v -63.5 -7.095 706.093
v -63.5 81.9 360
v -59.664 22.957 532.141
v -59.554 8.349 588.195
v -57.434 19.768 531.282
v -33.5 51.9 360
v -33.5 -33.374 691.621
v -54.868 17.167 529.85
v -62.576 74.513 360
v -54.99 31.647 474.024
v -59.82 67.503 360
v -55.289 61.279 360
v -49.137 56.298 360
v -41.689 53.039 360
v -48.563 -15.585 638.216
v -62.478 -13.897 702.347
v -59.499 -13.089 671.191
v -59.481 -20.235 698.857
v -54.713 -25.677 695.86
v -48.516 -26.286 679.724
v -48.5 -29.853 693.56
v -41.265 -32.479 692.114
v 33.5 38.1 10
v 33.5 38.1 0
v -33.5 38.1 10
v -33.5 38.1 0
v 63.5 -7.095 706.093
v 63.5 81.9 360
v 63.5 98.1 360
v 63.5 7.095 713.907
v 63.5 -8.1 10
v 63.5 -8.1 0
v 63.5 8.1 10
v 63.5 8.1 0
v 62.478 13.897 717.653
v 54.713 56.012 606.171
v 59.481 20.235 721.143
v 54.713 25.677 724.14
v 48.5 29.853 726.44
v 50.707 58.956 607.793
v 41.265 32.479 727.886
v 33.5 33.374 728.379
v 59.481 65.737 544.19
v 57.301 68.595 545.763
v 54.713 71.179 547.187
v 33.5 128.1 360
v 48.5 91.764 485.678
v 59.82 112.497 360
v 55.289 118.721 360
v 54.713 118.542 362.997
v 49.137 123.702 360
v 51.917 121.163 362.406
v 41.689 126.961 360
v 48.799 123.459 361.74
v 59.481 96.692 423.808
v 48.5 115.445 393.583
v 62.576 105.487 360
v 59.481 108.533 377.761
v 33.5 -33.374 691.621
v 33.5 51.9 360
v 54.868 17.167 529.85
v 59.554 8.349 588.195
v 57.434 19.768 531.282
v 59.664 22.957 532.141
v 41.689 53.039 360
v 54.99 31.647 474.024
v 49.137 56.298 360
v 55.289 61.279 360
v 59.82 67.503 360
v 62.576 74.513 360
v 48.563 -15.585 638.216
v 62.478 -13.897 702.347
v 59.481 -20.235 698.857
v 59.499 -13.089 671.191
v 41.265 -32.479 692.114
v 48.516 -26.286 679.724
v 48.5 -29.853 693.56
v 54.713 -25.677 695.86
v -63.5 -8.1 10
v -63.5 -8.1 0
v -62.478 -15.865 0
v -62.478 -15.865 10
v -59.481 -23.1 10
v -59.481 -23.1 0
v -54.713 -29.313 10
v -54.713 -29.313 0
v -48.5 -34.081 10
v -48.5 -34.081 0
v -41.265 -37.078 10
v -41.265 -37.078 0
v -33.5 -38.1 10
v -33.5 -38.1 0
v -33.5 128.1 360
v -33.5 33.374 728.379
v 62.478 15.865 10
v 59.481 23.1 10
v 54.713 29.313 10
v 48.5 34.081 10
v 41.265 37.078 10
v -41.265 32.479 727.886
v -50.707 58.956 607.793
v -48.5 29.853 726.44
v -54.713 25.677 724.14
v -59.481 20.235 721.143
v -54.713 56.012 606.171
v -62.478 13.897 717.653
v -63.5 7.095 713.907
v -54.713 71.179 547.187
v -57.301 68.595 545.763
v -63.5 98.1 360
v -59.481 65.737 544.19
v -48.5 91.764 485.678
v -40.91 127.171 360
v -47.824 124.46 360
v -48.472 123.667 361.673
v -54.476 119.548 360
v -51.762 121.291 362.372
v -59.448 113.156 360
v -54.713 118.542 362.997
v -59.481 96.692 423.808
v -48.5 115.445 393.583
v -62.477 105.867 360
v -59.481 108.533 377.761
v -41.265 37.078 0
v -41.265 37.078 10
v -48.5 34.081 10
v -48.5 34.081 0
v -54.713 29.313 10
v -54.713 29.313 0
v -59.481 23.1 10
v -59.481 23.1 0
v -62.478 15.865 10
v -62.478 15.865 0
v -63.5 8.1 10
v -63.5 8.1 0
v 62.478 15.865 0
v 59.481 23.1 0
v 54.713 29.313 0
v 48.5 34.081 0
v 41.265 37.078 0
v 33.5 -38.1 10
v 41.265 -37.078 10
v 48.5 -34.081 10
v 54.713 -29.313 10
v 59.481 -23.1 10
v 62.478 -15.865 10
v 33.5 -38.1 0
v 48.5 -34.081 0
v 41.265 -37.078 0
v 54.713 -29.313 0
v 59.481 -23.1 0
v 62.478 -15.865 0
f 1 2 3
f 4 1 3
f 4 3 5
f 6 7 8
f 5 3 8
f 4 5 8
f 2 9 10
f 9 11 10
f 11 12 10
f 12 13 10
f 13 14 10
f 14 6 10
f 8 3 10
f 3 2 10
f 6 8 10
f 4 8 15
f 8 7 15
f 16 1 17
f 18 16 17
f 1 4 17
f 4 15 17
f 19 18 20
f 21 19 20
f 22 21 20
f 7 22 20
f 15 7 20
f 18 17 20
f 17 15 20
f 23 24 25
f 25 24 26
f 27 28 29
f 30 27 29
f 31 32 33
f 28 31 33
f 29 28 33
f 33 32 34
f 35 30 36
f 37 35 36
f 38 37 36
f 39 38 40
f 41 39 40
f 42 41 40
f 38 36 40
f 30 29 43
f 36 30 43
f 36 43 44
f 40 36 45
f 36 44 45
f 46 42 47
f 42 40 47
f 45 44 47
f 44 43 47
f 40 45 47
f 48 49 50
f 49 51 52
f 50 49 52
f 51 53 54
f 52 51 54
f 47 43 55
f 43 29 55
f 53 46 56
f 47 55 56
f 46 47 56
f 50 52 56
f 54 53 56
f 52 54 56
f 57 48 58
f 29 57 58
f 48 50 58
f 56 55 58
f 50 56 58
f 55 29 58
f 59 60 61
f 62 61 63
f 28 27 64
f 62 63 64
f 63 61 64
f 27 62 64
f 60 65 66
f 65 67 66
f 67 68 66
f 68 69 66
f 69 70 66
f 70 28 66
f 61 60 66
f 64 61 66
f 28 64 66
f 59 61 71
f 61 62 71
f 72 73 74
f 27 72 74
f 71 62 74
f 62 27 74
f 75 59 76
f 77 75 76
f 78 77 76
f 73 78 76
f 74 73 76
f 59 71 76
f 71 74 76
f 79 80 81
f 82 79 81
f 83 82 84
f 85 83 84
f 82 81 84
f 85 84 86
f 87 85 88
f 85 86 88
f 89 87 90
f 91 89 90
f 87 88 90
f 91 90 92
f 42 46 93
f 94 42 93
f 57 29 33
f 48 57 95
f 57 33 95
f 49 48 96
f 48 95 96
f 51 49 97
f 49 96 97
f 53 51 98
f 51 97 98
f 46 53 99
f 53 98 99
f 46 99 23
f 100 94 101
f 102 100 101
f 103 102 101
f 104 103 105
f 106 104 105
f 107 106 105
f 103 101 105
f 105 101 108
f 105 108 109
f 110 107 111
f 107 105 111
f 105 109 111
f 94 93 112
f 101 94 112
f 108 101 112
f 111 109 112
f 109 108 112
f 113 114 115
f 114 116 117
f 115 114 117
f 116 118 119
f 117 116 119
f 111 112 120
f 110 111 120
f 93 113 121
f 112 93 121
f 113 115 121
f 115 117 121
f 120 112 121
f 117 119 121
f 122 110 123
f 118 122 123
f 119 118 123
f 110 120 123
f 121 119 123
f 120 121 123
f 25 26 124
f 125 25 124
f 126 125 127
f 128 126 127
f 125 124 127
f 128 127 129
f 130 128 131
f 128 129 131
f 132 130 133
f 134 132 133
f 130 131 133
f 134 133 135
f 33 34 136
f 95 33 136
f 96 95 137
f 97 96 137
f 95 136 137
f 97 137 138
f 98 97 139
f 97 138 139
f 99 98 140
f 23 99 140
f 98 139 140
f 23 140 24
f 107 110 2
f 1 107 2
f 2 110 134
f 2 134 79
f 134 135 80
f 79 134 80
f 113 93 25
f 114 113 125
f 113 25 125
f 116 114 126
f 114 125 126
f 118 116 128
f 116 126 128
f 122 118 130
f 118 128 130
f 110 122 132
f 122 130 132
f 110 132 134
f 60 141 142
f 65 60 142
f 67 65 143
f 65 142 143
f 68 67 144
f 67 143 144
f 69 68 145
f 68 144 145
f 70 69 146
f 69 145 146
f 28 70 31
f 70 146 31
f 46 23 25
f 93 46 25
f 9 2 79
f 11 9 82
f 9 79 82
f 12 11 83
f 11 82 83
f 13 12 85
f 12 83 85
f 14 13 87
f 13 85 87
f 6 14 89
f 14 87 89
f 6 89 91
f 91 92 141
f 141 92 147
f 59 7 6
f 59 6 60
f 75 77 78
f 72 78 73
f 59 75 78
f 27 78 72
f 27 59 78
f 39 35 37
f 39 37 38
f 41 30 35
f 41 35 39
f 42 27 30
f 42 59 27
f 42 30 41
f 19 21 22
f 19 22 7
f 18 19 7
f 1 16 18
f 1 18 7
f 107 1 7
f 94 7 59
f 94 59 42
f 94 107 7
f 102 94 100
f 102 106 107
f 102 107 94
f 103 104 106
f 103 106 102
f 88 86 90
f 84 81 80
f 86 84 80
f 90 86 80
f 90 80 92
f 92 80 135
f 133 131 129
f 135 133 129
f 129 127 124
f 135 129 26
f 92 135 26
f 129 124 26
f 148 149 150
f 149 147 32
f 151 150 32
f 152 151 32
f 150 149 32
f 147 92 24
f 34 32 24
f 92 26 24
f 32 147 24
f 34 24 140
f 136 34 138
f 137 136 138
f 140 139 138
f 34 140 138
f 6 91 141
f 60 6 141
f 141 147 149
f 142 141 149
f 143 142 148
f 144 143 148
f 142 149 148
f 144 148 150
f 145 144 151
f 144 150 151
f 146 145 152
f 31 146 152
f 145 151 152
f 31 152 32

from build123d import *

# Parameters (mm, degrees)
SALIENTE_EXTRUIR1_DEPTH = 10


with BuildPart() as part:
    # Croquis1 → Saliente-Extruir1 (new body)
    with BuildSketch(Plane.XY):
        with BuildLine():
            Line((-33.5, -38.1), (33.5, -38.1))
            ThreePointArc((33.5, -38.1), (54.713203436, -29.313203436), (63.5, -8.1))
            Line((63.5, -8.1), (63.5, 8.1))
            ThreePointArc((63.5, 8.1), (54.713203436, 29.313203436), (33.5, 38.1))
            Line((33.5, 38.1), (-33.5, 38.1))
            ThreePointArc((-33.5, 38.1), (-54.713203436, 29.313203436), (-63.5, 8.1))
            Line((-63.5, 8.1), (-63.5, -8.1))
            ThreePointArc((-63.5, -8.1), (-54.713203436, -29.313203436), (-33.5, -38.1))
        make_face()
    extrude(amount=SALIENTE_EXTRUIR1_DEPTH)

    # Barrer1: sweep along a curve in space
    with BuildLine() as barrer1_path:
        Line((0, 90, 360), (0, 0, 10))
        Line((0, 90, 360), (0, 0, 710))
    # Croquis3 → Barrer1 (sweep)
    with BuildSketch(Plane.XY.offset(10)):
        with BuildLine():
            Line((33.5, -38.1), (-33.5, -38.1))
            ThreePointArc((-33.5, -38.1), (-54.713203436, -29.313203436), (-63.5, -8.1))
            Line((-63.5, -8.1), (-63.5, 8.1))
            ThreePointArc((-63.5, 8.1), (-54.713203436, 29.313203436), (-33.5, 38.1))
            Line((-33.5, 38.1), (33.5, 38.1))
            ThreePointArc((33.5, 38.1), (54.713203436, 29.313203436), (63.5, 8.1))
            Line((63.5, 8.1), (63.5, -8.1))
            ThreePointArc((63.5, -8.1), (54.713203436, -29.313203436), (33.5, -38.1))
        make_face()
    sweep(path=barrer1_path.line, transition=Transition.RIGHT)


solid = part.part
